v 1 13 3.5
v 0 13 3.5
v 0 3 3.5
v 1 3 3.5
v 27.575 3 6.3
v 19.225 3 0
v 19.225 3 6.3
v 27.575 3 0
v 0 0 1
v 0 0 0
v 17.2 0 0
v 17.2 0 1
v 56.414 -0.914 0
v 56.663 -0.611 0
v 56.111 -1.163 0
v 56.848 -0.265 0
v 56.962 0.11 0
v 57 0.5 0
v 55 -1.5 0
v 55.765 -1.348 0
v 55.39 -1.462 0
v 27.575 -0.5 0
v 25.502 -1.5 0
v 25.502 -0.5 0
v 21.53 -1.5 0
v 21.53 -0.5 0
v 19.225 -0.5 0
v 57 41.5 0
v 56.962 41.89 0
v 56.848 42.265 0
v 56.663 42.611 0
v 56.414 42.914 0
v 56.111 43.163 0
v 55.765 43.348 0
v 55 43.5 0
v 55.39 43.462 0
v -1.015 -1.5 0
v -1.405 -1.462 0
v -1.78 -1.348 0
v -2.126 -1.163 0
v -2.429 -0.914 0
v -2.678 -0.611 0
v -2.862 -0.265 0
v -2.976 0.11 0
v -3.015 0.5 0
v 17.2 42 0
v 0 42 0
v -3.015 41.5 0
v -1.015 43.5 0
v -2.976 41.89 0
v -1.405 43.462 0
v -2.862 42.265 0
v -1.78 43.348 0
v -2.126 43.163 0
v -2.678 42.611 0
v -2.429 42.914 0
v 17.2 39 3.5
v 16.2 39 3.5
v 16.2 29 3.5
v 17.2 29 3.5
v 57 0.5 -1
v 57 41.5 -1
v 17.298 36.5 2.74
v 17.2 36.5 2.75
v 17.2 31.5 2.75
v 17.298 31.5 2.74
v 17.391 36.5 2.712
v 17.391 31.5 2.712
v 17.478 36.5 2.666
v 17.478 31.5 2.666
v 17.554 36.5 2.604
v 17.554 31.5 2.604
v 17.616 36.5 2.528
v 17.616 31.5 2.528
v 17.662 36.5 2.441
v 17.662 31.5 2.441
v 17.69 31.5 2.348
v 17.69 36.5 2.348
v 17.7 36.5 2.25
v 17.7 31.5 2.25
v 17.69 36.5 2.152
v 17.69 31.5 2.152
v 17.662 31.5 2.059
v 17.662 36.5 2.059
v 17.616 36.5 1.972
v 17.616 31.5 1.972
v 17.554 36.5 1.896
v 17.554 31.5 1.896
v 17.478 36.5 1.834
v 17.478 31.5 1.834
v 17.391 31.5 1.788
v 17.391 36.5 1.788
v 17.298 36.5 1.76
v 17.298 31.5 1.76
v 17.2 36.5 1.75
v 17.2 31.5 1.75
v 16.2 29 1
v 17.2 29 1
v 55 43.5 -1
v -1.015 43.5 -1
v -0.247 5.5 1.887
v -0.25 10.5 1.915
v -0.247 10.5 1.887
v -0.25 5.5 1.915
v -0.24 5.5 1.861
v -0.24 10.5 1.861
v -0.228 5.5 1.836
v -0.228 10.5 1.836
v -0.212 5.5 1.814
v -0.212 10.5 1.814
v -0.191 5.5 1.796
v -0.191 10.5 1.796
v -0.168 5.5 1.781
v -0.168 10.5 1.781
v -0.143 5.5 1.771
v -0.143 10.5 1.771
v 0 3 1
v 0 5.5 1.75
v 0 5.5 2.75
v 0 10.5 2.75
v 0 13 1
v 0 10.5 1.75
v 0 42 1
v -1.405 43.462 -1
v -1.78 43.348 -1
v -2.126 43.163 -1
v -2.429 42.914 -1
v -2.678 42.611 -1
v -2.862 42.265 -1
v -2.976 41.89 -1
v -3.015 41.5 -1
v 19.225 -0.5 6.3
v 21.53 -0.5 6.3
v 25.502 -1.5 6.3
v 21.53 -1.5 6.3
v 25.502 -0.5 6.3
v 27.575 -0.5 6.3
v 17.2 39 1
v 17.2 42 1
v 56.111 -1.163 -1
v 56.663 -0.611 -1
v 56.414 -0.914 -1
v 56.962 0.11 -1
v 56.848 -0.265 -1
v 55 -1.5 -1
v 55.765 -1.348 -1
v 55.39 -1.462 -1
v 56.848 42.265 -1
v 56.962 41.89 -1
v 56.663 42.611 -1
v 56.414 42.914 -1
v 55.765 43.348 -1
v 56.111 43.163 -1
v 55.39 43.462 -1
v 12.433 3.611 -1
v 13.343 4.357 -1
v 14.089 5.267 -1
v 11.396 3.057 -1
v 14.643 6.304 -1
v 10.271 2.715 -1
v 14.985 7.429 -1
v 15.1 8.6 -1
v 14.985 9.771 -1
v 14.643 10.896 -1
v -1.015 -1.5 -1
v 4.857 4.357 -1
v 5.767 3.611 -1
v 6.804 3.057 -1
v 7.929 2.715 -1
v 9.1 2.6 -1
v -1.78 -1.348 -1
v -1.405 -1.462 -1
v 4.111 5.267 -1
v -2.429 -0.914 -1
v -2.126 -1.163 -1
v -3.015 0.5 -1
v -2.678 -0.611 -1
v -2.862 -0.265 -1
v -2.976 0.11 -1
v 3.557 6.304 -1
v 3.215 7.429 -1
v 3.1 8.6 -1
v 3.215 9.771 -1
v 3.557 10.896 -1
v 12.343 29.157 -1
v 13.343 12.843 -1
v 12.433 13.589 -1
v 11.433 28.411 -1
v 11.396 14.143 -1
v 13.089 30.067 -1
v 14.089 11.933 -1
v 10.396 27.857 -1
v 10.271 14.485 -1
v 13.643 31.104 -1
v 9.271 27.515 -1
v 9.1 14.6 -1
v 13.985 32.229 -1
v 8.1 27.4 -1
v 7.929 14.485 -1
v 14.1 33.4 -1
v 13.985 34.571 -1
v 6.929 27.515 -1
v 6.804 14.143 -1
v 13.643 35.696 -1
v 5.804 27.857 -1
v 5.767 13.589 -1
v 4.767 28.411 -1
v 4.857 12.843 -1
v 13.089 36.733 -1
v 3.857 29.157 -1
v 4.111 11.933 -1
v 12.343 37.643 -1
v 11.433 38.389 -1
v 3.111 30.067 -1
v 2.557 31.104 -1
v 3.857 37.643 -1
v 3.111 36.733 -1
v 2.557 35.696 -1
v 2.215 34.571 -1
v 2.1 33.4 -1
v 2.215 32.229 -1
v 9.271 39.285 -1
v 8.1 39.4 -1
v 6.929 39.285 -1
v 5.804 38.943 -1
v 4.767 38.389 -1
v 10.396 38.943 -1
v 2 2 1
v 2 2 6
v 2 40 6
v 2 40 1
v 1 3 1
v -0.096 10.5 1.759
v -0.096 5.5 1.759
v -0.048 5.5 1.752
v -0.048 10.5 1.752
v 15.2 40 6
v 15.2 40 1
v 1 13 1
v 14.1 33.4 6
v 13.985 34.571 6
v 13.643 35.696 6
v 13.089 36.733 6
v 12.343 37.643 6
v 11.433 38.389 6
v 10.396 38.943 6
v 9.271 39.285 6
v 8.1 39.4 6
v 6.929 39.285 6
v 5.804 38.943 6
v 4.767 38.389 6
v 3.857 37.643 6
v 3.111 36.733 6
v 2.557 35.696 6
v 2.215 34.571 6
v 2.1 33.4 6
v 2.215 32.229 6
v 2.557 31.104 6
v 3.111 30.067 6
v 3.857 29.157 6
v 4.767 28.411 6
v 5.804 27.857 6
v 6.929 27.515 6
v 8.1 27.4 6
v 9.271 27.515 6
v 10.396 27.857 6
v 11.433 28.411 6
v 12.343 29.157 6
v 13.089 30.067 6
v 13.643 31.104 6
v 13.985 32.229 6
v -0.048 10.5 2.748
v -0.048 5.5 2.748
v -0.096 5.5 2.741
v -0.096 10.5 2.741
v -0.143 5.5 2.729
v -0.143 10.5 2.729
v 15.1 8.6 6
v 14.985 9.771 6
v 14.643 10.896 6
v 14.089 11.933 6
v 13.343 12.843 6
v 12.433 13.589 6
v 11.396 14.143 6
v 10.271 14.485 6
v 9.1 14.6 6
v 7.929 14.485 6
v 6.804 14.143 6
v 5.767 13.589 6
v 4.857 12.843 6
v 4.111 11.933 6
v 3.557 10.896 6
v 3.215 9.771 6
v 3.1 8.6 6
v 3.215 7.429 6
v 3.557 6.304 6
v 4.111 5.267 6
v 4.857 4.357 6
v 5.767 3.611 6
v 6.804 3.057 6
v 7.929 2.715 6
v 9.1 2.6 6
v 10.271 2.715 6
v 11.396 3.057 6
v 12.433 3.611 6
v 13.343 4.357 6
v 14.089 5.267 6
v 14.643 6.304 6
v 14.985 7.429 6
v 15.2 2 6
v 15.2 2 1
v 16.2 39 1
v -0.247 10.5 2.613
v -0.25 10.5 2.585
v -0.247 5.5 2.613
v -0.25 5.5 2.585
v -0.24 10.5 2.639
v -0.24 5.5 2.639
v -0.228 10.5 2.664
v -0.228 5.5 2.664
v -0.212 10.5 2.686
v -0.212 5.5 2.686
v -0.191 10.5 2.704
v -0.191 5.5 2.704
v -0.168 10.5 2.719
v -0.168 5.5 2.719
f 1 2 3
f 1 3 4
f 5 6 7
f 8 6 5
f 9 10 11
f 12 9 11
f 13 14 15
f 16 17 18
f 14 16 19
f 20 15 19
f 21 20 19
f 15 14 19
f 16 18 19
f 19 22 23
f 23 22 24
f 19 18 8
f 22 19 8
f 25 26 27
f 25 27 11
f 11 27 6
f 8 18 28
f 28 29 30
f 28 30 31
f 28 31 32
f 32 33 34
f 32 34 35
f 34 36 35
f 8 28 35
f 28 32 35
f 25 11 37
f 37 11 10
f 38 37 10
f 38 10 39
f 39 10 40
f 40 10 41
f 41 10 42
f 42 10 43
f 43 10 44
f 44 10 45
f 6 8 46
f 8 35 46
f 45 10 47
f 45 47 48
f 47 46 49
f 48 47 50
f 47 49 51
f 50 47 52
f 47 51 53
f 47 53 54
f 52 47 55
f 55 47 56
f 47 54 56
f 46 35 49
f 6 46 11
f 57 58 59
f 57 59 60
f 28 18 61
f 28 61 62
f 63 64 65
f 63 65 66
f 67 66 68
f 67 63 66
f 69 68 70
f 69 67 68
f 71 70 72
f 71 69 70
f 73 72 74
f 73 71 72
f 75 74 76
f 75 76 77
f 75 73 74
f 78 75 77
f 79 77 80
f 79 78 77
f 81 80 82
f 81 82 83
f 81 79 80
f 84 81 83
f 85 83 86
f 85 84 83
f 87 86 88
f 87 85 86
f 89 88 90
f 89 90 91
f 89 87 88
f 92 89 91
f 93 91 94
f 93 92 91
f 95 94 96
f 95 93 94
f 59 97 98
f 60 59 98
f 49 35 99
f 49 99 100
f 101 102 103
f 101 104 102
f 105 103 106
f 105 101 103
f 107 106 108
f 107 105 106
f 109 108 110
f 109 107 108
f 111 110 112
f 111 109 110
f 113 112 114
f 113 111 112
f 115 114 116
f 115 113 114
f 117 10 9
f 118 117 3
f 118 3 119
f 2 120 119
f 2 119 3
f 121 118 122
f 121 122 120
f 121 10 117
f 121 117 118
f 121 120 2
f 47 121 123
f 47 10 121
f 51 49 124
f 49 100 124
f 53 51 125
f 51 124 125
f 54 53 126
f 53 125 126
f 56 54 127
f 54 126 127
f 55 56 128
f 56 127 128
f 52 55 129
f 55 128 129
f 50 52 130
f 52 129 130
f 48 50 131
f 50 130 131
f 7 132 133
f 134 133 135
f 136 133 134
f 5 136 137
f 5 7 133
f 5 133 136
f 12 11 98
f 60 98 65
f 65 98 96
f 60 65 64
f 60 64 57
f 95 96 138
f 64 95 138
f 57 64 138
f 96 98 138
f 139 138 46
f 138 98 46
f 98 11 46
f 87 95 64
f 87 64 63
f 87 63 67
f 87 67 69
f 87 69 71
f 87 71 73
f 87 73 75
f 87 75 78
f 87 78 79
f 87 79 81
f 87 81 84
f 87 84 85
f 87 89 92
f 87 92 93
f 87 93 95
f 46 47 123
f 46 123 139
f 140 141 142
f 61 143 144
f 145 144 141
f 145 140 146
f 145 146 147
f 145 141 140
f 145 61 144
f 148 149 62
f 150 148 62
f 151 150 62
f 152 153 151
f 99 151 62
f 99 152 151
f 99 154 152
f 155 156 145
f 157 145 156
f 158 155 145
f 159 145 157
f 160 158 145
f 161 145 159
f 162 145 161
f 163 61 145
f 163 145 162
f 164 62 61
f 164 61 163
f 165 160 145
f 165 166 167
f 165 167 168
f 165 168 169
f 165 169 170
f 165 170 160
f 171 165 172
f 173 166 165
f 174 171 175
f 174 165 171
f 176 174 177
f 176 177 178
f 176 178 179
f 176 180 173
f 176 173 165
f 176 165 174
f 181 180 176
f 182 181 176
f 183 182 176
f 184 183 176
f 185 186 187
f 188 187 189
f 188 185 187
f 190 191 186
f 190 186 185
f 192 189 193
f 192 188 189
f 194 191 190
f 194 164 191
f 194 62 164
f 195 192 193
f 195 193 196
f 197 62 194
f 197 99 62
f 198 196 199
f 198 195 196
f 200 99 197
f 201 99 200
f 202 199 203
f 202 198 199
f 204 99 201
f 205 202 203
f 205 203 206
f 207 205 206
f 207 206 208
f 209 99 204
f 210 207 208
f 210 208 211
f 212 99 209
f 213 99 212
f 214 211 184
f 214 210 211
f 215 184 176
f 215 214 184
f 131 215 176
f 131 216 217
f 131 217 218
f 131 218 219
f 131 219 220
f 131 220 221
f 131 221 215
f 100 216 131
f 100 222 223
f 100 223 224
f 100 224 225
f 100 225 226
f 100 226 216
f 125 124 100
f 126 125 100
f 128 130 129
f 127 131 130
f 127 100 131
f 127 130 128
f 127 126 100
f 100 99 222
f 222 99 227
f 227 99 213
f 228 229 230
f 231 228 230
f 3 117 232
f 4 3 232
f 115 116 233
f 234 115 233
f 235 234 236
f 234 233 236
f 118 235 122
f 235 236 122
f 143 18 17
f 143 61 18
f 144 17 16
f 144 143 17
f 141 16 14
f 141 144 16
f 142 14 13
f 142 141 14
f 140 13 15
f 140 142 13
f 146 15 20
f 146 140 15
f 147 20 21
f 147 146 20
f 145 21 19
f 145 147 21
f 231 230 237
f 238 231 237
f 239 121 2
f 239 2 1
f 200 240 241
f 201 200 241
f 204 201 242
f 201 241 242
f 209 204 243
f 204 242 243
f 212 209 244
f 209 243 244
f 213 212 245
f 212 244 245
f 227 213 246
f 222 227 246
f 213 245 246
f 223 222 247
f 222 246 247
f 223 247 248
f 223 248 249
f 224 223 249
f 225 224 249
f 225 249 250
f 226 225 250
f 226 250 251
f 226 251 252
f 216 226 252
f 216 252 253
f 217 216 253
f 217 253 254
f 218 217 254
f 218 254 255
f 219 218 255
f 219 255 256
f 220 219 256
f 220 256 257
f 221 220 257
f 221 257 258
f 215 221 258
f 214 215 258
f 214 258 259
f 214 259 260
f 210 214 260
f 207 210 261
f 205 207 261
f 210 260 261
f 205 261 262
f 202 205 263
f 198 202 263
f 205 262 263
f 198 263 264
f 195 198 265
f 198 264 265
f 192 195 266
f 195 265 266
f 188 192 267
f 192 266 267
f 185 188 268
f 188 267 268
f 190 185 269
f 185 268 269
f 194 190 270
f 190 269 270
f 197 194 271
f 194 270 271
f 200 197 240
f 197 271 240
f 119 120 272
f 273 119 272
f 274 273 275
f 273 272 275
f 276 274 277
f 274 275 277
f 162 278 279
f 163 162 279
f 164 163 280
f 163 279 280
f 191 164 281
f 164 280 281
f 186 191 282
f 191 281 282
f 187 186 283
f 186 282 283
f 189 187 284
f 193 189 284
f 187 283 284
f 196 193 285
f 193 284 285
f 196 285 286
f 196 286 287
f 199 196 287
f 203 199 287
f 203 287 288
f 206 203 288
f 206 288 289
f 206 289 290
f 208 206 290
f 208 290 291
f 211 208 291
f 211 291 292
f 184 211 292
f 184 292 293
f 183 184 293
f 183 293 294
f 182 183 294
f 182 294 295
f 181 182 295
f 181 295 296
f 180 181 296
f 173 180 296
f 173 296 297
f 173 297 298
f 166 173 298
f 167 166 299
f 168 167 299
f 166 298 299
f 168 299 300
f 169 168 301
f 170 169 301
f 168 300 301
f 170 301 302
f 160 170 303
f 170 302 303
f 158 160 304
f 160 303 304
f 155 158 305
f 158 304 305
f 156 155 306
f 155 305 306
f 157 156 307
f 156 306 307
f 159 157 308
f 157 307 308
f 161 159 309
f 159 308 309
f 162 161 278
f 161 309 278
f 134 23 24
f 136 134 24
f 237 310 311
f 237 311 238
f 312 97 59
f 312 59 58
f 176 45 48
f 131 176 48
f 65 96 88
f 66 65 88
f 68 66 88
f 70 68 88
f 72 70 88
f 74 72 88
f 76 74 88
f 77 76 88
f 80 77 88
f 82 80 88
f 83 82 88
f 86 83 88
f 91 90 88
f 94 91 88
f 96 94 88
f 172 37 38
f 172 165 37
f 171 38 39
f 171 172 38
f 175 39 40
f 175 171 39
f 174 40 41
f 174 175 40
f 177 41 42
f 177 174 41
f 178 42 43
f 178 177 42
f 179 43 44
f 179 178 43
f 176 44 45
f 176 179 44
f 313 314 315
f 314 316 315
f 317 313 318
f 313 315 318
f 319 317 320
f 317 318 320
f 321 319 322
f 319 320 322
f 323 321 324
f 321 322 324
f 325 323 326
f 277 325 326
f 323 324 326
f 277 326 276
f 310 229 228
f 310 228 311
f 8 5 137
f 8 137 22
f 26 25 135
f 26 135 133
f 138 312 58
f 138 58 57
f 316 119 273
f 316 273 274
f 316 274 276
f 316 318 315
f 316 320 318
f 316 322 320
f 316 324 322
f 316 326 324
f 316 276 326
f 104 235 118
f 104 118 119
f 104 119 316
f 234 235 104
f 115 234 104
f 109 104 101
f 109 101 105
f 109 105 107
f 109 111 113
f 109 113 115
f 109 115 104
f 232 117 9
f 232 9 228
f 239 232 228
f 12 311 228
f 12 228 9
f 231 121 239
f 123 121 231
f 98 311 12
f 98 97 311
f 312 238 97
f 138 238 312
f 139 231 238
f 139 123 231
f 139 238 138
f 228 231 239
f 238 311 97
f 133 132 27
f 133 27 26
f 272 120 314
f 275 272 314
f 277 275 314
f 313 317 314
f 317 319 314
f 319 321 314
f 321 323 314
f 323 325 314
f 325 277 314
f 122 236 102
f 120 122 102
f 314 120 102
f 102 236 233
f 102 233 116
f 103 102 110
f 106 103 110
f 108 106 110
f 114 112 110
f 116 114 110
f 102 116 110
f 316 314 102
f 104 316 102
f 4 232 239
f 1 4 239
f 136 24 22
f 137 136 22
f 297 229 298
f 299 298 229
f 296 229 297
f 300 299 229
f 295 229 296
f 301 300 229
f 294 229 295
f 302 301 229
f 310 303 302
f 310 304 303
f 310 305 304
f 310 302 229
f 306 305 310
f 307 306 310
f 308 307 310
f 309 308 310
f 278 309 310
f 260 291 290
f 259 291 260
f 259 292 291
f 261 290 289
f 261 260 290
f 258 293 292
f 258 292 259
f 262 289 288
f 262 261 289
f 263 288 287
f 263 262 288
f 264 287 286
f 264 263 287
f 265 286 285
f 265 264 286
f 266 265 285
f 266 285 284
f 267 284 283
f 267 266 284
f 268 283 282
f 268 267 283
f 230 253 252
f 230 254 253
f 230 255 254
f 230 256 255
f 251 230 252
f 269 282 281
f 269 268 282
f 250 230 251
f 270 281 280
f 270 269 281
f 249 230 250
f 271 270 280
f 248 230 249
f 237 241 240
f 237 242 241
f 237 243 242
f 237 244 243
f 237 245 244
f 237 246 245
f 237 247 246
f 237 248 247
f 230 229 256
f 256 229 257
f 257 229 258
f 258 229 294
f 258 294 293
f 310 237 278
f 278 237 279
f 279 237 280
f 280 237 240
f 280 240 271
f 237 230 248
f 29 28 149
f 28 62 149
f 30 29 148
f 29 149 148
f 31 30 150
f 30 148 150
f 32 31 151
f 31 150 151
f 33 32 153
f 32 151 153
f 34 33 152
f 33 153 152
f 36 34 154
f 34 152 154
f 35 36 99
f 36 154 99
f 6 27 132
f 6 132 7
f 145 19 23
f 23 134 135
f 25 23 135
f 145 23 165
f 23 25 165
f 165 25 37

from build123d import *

# Parameters (mm, degrees)
SKETCH_1_W           = 17.2
SKETCH_1_H           = 42
SKETCH_1_W_2         = 13.2
SKETCH_1_H_2         = 38
EXTRUDE_1_DEPTH      = 1
SKETCH_2_W           = 1
SKETCH_2_H           = 10
EXTRUDE_2_DEPTH      = 2.5
EXTRUDE_3_DEPTH      = 2.5
EXTRUDE_3_DEPTH_BACK = 2.5
EXTRUDE_4_DEPTH      = 2.5
EXTRUDE_4_DEPTH_BACK = 2.5
SKETCH_5_W           = 60.014732212
SKETCH_5_H           = 45
EXTRUDE_5_DEPTH      = 1
FILLET_1_R           = 2
SKETCH_6_W           = 8.55
SKETCH_6_H           = 3.5
EXTRUDE_6_DEPTH      = 6.3
SKETCH_7_W           = 3.972075094
SKETCH_7_H           = 1
EXTRUDE_7_DEPTH      = 6.3
SKETCH_8_R           = 6
CUT_EXTRUDE_1_DEPTH  = 72.978746863
EXTRUDE_START        = 6
SKETCH_9_W           = 13.2
SKETCH_9_H           = 38
SKETCH_9_R           = 6
EXTRUDE_8_DEPTH      = 6
FILLET_2_R           = 0.15
SKETCH_10_W          = 6.3
SKETCH_10_H          = 3.5
CUT_EXTRUDE_2_DEPTH  = 0.2


with BuildPart() as part:
    # 草图1 → 凸台-拉伸1 (new body)
    with BuildSketch(Plane.XY):
        with Locations((8.6, 21)):
            Rectangle(SKETCH_1_W, SKETCH_1_H)
        with Locations((8.6, 21)):
            Rectangle(SKETCH_1_W_2, SKETCH_1_H_2, mode=Mode.SUBTRACT)
    extrude(amount=EXTRUDE_1_DEPTH)

    # 草图2 → 凸台-拉伸2 (add)
    with BuildSketch(Plane.XY.offset(1)):
        with Locations((16.7, 34)):
            Rectangle(SKETCH_2_W, SKETCH_2_H)
        with Locations((0.5, 8)):
            Rectangle(SKETCH_2_W, SKETCH_2_H)
    extrude(amount=EXTRUDE_2_DEPTH)

    # 草图3 → 凸台-拉伸3 (add, two sides: drawn at the far end of the back side and taken through both)
    with BuildSketch(Plane(origin=(0, 34, 0), x_dir=(-1, 0, 0), z_dir=(0, -1, 0)).offset(-EXTRUDE_3_DEPTH_BACK)):
        with BuildLine():
            Line((-17.2, -1.75), (-17.2, -2.75))
            ThreePointArc((-17.2, -2.75), (-17.7, -2.25), (-17.2, -1.75))
        make_face()
    extrude(amount=EXTRUDE_3_DEPTH + EXTRUDE_3_DEPTH_BACK)

    # 草图4 → 凸台-拉伸4 (add, two sides: drawn at the far end of the back side and taken through both)
    with BuildSketch(Plane(origin=(0, 8, 0), x_dir=(-1, 0, 0), z_dir=(0, -1, 0)).offset(-EXTRUDE_4_DEPTH_BACK)):
        with BuildLine():
            Line((0, -1.75), (0, -2.75))
            ThreePointArc((0, -2.75), (0.129409523, -2.732962913), (0.25, -2.683012702))
            Line((0.25, -2.683012702), (0.25, -1.816987298))
            ThreePointArc((0.25, -1.816987298), (0.129409523, -1.767037087), (0, -1.75))
        make_face()
    extrude(amount=EXTRUDE_4_DEPTH + EXTRUDE_4_DEPTH_BACK)

    # 草图5 → 凸台-拉伸5 (add)
    with BuildSketch(Plane(origin=(0, 0, 0), x_dir=(-1, 0, 0), z_dir=(0, 0, -1))):
        with Locations((-26.992633894, 21)):
            Rectangle(SKETCH_5_W, SKETCH_5_H)
    extrude(amount=EXTRUDE_5_DEPTH)

    # 圆角1
    fillet_1_edges = [part.edges().sort_by_distance(p)[0] for p in [
        (57, 43.5, -0.5),
        (57, -1.5, -0.5),
        (-3.014732212, -1.5, -0.5),
        (-3.014732212, 43.5, -0.5),
    ]]
    fillet(fillet_1_edges, radius=FILLET_1_R)

    # 草图6 → 凸台-拉伸6 (add)
    with BuildSketch(Plane.XY):
        with Locations((23.5, 1.25)):
            Rectangle(SKETCH_6_W, SKETCH_6_H)
    extrude(amount=EXTRUDE_6_DEPTH)

    # 草图7 → 凸台-拉伸7 (add)
    with BuildSketch(Plane.XY):
        with Locations((23.516201891, -1)):
            Rectangle(SKETCH_7_W, SKETCH_7_H)
    extrude(amount=EXTRUDE_7_DEPTH)

    # 草图8 → 切除-拉伸1 (cut, through all)
    with BuildSketch(Plane.XY):
        with Locations((9.1, 8.6)):
            Circle(SKETCH_8_R)
        with Locations((8.1, 33.4)):
            Circle(SKETCH_8_R)
    extrude(amount=-CUT_EXTRUDE_1_DEPTH, mode=Mode.SUBTRACT)

    # 草图9 → 凸台-拉伸8 (add)
    with BuildSketch(Plane.XY.offset(EXTRUDE_START)):
        with Locations((8.6, 21)):
            Rectangle(SKETCH_9_W, SKETCH_9_H)
        with Locations((9.1, 8.6)):
            Circle(SKETCH_9_R, mode=Mode.SUBTRACT)
        with Locations((8.1, 33.4)):
            Circle(SKETCH_9_R, mode=Mode.SUBTRACT)
    extrude(amount=-EXTRUDE_8_DEPTH)

    # 圆角2
    fillet_2_edges = [part.edges().sort_by_distance(p)[0] for p in [
        (-0.25, 8, 1.816987298),
        (-0.25, 8, 2.683012702),
    ]]
    fillet(fillet_2_edges, radius=FILLET_2_R)

    # 草图10 → 切除-拉伸2 (cut)
    with BuildSketch(Plane(origin=(27.775, 0, 0), x_dir=(0, 0, -1), z_dir=(1, 0, 0))):
        with Locations((-3.15, 1.25)):
            Rectangle(SKETCH_10_W, SKETCH_10_H)
    extrude(amount=-CUT_EXTRUDE_2_DEPTH, mode=Mode.SUBTRACT)


solid = part.part
